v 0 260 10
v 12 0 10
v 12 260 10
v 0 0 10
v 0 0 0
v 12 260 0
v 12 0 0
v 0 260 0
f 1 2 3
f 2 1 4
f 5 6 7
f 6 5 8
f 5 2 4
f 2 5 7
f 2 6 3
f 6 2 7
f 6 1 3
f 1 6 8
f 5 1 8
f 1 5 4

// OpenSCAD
$fn = 80;

strip_t = 4;
strip_w = 12;
strip_l = 62;

in = 10;
t = 5;
h = in + strip_t + t;

module dual_bottle(bottle){

	bottle_r = 37;
	d = 56;
	strip_holder_h = 250;
	strip_holder_w = 35;
	
	motor_r = 26.5/2; 
	motor_h = 35;
	motor_z = 180;
	if (bottle) {
		difference(){
			union(){
				translate([d,0,0])
				cylinder(h=h,r=bottle_r+t);
				cylinder(h=h,r=bottle_r+t);
				translate([0,bottle_r/2,0])
				cube([d,bottle_r,h-in]);
			}
			translate([0,0,h-in]){
				translate([d,0,0])
				cylinder(h=in,r=bottle_r);
				cylinder(h=in,r=bottle_r);
			}
			translate([d/2-(1/2)*strip_w,-bottle_r/2,h-in-strip_t])
			cube([strip_w,strip_l,strip_t+in]);

			translate([(d-strip_holder_w)/2,(3/2)*bottle_r-2*t,0])
			cube([strip_holder_w,t,h-in]);

			translate([0,-bottle_r,h-in])
			cube([d,2*bottle_r,in]);
		}
	}
	else { //strip holder
		cube([strip_holder_w,strip_holder_h,t]);
		translate([-t,h-in,0])
		cube([strip_holder_w+2*t,t,2*t]);
		
		translate([motor_r+t,motor_z,motor_r+1.5*t])
		rotate(a=[-90,0,0])
		difference(){
			cylinder(r=motor_r+t, h=motor_h);
			cylinder(r=motor_r, h=motor_h);
			translate([-t,-(motor_r+t),0])
			cube([2*t,2*t,motor_h]);
		}
	}
}

module square_bottle(base){
	w = 122;
	l = 111;//back to front
	out = 80;
	tapon_r = 24/2;
	tapon_h = 25 + 2*t;
	hose_r = 3.3;

	if (base){
		difference(){
			translate([0,-out,0])
			cube([w+2*t,l+2*t+out,h]);
			translate([t,t,h-in])
			cube([w,l,in]);
		
			translate([0,-out,h-in])
			cube([w+2*t,out,in]);
		
			for (x = [l/3-strip_w/2:2.5*strip_w:l+t-strip_w]){
				translate([x,0,h-in-strip_t])
				cube([strip_w,l+t,strip_t+in]);
			}
		}
	}
	else { // tapon
		difference(){
			union(){
				cylinder(r=tapon_r+t,h=2*t);
				cylinder(r=tapon_r,h=tapon_h);
			}
			cylinder(r=hose_r,h=tapon_h);
		}
	}
}

//square_bottle(false);
//dual_bottle(false);

cube([strip_w,260,10]);
